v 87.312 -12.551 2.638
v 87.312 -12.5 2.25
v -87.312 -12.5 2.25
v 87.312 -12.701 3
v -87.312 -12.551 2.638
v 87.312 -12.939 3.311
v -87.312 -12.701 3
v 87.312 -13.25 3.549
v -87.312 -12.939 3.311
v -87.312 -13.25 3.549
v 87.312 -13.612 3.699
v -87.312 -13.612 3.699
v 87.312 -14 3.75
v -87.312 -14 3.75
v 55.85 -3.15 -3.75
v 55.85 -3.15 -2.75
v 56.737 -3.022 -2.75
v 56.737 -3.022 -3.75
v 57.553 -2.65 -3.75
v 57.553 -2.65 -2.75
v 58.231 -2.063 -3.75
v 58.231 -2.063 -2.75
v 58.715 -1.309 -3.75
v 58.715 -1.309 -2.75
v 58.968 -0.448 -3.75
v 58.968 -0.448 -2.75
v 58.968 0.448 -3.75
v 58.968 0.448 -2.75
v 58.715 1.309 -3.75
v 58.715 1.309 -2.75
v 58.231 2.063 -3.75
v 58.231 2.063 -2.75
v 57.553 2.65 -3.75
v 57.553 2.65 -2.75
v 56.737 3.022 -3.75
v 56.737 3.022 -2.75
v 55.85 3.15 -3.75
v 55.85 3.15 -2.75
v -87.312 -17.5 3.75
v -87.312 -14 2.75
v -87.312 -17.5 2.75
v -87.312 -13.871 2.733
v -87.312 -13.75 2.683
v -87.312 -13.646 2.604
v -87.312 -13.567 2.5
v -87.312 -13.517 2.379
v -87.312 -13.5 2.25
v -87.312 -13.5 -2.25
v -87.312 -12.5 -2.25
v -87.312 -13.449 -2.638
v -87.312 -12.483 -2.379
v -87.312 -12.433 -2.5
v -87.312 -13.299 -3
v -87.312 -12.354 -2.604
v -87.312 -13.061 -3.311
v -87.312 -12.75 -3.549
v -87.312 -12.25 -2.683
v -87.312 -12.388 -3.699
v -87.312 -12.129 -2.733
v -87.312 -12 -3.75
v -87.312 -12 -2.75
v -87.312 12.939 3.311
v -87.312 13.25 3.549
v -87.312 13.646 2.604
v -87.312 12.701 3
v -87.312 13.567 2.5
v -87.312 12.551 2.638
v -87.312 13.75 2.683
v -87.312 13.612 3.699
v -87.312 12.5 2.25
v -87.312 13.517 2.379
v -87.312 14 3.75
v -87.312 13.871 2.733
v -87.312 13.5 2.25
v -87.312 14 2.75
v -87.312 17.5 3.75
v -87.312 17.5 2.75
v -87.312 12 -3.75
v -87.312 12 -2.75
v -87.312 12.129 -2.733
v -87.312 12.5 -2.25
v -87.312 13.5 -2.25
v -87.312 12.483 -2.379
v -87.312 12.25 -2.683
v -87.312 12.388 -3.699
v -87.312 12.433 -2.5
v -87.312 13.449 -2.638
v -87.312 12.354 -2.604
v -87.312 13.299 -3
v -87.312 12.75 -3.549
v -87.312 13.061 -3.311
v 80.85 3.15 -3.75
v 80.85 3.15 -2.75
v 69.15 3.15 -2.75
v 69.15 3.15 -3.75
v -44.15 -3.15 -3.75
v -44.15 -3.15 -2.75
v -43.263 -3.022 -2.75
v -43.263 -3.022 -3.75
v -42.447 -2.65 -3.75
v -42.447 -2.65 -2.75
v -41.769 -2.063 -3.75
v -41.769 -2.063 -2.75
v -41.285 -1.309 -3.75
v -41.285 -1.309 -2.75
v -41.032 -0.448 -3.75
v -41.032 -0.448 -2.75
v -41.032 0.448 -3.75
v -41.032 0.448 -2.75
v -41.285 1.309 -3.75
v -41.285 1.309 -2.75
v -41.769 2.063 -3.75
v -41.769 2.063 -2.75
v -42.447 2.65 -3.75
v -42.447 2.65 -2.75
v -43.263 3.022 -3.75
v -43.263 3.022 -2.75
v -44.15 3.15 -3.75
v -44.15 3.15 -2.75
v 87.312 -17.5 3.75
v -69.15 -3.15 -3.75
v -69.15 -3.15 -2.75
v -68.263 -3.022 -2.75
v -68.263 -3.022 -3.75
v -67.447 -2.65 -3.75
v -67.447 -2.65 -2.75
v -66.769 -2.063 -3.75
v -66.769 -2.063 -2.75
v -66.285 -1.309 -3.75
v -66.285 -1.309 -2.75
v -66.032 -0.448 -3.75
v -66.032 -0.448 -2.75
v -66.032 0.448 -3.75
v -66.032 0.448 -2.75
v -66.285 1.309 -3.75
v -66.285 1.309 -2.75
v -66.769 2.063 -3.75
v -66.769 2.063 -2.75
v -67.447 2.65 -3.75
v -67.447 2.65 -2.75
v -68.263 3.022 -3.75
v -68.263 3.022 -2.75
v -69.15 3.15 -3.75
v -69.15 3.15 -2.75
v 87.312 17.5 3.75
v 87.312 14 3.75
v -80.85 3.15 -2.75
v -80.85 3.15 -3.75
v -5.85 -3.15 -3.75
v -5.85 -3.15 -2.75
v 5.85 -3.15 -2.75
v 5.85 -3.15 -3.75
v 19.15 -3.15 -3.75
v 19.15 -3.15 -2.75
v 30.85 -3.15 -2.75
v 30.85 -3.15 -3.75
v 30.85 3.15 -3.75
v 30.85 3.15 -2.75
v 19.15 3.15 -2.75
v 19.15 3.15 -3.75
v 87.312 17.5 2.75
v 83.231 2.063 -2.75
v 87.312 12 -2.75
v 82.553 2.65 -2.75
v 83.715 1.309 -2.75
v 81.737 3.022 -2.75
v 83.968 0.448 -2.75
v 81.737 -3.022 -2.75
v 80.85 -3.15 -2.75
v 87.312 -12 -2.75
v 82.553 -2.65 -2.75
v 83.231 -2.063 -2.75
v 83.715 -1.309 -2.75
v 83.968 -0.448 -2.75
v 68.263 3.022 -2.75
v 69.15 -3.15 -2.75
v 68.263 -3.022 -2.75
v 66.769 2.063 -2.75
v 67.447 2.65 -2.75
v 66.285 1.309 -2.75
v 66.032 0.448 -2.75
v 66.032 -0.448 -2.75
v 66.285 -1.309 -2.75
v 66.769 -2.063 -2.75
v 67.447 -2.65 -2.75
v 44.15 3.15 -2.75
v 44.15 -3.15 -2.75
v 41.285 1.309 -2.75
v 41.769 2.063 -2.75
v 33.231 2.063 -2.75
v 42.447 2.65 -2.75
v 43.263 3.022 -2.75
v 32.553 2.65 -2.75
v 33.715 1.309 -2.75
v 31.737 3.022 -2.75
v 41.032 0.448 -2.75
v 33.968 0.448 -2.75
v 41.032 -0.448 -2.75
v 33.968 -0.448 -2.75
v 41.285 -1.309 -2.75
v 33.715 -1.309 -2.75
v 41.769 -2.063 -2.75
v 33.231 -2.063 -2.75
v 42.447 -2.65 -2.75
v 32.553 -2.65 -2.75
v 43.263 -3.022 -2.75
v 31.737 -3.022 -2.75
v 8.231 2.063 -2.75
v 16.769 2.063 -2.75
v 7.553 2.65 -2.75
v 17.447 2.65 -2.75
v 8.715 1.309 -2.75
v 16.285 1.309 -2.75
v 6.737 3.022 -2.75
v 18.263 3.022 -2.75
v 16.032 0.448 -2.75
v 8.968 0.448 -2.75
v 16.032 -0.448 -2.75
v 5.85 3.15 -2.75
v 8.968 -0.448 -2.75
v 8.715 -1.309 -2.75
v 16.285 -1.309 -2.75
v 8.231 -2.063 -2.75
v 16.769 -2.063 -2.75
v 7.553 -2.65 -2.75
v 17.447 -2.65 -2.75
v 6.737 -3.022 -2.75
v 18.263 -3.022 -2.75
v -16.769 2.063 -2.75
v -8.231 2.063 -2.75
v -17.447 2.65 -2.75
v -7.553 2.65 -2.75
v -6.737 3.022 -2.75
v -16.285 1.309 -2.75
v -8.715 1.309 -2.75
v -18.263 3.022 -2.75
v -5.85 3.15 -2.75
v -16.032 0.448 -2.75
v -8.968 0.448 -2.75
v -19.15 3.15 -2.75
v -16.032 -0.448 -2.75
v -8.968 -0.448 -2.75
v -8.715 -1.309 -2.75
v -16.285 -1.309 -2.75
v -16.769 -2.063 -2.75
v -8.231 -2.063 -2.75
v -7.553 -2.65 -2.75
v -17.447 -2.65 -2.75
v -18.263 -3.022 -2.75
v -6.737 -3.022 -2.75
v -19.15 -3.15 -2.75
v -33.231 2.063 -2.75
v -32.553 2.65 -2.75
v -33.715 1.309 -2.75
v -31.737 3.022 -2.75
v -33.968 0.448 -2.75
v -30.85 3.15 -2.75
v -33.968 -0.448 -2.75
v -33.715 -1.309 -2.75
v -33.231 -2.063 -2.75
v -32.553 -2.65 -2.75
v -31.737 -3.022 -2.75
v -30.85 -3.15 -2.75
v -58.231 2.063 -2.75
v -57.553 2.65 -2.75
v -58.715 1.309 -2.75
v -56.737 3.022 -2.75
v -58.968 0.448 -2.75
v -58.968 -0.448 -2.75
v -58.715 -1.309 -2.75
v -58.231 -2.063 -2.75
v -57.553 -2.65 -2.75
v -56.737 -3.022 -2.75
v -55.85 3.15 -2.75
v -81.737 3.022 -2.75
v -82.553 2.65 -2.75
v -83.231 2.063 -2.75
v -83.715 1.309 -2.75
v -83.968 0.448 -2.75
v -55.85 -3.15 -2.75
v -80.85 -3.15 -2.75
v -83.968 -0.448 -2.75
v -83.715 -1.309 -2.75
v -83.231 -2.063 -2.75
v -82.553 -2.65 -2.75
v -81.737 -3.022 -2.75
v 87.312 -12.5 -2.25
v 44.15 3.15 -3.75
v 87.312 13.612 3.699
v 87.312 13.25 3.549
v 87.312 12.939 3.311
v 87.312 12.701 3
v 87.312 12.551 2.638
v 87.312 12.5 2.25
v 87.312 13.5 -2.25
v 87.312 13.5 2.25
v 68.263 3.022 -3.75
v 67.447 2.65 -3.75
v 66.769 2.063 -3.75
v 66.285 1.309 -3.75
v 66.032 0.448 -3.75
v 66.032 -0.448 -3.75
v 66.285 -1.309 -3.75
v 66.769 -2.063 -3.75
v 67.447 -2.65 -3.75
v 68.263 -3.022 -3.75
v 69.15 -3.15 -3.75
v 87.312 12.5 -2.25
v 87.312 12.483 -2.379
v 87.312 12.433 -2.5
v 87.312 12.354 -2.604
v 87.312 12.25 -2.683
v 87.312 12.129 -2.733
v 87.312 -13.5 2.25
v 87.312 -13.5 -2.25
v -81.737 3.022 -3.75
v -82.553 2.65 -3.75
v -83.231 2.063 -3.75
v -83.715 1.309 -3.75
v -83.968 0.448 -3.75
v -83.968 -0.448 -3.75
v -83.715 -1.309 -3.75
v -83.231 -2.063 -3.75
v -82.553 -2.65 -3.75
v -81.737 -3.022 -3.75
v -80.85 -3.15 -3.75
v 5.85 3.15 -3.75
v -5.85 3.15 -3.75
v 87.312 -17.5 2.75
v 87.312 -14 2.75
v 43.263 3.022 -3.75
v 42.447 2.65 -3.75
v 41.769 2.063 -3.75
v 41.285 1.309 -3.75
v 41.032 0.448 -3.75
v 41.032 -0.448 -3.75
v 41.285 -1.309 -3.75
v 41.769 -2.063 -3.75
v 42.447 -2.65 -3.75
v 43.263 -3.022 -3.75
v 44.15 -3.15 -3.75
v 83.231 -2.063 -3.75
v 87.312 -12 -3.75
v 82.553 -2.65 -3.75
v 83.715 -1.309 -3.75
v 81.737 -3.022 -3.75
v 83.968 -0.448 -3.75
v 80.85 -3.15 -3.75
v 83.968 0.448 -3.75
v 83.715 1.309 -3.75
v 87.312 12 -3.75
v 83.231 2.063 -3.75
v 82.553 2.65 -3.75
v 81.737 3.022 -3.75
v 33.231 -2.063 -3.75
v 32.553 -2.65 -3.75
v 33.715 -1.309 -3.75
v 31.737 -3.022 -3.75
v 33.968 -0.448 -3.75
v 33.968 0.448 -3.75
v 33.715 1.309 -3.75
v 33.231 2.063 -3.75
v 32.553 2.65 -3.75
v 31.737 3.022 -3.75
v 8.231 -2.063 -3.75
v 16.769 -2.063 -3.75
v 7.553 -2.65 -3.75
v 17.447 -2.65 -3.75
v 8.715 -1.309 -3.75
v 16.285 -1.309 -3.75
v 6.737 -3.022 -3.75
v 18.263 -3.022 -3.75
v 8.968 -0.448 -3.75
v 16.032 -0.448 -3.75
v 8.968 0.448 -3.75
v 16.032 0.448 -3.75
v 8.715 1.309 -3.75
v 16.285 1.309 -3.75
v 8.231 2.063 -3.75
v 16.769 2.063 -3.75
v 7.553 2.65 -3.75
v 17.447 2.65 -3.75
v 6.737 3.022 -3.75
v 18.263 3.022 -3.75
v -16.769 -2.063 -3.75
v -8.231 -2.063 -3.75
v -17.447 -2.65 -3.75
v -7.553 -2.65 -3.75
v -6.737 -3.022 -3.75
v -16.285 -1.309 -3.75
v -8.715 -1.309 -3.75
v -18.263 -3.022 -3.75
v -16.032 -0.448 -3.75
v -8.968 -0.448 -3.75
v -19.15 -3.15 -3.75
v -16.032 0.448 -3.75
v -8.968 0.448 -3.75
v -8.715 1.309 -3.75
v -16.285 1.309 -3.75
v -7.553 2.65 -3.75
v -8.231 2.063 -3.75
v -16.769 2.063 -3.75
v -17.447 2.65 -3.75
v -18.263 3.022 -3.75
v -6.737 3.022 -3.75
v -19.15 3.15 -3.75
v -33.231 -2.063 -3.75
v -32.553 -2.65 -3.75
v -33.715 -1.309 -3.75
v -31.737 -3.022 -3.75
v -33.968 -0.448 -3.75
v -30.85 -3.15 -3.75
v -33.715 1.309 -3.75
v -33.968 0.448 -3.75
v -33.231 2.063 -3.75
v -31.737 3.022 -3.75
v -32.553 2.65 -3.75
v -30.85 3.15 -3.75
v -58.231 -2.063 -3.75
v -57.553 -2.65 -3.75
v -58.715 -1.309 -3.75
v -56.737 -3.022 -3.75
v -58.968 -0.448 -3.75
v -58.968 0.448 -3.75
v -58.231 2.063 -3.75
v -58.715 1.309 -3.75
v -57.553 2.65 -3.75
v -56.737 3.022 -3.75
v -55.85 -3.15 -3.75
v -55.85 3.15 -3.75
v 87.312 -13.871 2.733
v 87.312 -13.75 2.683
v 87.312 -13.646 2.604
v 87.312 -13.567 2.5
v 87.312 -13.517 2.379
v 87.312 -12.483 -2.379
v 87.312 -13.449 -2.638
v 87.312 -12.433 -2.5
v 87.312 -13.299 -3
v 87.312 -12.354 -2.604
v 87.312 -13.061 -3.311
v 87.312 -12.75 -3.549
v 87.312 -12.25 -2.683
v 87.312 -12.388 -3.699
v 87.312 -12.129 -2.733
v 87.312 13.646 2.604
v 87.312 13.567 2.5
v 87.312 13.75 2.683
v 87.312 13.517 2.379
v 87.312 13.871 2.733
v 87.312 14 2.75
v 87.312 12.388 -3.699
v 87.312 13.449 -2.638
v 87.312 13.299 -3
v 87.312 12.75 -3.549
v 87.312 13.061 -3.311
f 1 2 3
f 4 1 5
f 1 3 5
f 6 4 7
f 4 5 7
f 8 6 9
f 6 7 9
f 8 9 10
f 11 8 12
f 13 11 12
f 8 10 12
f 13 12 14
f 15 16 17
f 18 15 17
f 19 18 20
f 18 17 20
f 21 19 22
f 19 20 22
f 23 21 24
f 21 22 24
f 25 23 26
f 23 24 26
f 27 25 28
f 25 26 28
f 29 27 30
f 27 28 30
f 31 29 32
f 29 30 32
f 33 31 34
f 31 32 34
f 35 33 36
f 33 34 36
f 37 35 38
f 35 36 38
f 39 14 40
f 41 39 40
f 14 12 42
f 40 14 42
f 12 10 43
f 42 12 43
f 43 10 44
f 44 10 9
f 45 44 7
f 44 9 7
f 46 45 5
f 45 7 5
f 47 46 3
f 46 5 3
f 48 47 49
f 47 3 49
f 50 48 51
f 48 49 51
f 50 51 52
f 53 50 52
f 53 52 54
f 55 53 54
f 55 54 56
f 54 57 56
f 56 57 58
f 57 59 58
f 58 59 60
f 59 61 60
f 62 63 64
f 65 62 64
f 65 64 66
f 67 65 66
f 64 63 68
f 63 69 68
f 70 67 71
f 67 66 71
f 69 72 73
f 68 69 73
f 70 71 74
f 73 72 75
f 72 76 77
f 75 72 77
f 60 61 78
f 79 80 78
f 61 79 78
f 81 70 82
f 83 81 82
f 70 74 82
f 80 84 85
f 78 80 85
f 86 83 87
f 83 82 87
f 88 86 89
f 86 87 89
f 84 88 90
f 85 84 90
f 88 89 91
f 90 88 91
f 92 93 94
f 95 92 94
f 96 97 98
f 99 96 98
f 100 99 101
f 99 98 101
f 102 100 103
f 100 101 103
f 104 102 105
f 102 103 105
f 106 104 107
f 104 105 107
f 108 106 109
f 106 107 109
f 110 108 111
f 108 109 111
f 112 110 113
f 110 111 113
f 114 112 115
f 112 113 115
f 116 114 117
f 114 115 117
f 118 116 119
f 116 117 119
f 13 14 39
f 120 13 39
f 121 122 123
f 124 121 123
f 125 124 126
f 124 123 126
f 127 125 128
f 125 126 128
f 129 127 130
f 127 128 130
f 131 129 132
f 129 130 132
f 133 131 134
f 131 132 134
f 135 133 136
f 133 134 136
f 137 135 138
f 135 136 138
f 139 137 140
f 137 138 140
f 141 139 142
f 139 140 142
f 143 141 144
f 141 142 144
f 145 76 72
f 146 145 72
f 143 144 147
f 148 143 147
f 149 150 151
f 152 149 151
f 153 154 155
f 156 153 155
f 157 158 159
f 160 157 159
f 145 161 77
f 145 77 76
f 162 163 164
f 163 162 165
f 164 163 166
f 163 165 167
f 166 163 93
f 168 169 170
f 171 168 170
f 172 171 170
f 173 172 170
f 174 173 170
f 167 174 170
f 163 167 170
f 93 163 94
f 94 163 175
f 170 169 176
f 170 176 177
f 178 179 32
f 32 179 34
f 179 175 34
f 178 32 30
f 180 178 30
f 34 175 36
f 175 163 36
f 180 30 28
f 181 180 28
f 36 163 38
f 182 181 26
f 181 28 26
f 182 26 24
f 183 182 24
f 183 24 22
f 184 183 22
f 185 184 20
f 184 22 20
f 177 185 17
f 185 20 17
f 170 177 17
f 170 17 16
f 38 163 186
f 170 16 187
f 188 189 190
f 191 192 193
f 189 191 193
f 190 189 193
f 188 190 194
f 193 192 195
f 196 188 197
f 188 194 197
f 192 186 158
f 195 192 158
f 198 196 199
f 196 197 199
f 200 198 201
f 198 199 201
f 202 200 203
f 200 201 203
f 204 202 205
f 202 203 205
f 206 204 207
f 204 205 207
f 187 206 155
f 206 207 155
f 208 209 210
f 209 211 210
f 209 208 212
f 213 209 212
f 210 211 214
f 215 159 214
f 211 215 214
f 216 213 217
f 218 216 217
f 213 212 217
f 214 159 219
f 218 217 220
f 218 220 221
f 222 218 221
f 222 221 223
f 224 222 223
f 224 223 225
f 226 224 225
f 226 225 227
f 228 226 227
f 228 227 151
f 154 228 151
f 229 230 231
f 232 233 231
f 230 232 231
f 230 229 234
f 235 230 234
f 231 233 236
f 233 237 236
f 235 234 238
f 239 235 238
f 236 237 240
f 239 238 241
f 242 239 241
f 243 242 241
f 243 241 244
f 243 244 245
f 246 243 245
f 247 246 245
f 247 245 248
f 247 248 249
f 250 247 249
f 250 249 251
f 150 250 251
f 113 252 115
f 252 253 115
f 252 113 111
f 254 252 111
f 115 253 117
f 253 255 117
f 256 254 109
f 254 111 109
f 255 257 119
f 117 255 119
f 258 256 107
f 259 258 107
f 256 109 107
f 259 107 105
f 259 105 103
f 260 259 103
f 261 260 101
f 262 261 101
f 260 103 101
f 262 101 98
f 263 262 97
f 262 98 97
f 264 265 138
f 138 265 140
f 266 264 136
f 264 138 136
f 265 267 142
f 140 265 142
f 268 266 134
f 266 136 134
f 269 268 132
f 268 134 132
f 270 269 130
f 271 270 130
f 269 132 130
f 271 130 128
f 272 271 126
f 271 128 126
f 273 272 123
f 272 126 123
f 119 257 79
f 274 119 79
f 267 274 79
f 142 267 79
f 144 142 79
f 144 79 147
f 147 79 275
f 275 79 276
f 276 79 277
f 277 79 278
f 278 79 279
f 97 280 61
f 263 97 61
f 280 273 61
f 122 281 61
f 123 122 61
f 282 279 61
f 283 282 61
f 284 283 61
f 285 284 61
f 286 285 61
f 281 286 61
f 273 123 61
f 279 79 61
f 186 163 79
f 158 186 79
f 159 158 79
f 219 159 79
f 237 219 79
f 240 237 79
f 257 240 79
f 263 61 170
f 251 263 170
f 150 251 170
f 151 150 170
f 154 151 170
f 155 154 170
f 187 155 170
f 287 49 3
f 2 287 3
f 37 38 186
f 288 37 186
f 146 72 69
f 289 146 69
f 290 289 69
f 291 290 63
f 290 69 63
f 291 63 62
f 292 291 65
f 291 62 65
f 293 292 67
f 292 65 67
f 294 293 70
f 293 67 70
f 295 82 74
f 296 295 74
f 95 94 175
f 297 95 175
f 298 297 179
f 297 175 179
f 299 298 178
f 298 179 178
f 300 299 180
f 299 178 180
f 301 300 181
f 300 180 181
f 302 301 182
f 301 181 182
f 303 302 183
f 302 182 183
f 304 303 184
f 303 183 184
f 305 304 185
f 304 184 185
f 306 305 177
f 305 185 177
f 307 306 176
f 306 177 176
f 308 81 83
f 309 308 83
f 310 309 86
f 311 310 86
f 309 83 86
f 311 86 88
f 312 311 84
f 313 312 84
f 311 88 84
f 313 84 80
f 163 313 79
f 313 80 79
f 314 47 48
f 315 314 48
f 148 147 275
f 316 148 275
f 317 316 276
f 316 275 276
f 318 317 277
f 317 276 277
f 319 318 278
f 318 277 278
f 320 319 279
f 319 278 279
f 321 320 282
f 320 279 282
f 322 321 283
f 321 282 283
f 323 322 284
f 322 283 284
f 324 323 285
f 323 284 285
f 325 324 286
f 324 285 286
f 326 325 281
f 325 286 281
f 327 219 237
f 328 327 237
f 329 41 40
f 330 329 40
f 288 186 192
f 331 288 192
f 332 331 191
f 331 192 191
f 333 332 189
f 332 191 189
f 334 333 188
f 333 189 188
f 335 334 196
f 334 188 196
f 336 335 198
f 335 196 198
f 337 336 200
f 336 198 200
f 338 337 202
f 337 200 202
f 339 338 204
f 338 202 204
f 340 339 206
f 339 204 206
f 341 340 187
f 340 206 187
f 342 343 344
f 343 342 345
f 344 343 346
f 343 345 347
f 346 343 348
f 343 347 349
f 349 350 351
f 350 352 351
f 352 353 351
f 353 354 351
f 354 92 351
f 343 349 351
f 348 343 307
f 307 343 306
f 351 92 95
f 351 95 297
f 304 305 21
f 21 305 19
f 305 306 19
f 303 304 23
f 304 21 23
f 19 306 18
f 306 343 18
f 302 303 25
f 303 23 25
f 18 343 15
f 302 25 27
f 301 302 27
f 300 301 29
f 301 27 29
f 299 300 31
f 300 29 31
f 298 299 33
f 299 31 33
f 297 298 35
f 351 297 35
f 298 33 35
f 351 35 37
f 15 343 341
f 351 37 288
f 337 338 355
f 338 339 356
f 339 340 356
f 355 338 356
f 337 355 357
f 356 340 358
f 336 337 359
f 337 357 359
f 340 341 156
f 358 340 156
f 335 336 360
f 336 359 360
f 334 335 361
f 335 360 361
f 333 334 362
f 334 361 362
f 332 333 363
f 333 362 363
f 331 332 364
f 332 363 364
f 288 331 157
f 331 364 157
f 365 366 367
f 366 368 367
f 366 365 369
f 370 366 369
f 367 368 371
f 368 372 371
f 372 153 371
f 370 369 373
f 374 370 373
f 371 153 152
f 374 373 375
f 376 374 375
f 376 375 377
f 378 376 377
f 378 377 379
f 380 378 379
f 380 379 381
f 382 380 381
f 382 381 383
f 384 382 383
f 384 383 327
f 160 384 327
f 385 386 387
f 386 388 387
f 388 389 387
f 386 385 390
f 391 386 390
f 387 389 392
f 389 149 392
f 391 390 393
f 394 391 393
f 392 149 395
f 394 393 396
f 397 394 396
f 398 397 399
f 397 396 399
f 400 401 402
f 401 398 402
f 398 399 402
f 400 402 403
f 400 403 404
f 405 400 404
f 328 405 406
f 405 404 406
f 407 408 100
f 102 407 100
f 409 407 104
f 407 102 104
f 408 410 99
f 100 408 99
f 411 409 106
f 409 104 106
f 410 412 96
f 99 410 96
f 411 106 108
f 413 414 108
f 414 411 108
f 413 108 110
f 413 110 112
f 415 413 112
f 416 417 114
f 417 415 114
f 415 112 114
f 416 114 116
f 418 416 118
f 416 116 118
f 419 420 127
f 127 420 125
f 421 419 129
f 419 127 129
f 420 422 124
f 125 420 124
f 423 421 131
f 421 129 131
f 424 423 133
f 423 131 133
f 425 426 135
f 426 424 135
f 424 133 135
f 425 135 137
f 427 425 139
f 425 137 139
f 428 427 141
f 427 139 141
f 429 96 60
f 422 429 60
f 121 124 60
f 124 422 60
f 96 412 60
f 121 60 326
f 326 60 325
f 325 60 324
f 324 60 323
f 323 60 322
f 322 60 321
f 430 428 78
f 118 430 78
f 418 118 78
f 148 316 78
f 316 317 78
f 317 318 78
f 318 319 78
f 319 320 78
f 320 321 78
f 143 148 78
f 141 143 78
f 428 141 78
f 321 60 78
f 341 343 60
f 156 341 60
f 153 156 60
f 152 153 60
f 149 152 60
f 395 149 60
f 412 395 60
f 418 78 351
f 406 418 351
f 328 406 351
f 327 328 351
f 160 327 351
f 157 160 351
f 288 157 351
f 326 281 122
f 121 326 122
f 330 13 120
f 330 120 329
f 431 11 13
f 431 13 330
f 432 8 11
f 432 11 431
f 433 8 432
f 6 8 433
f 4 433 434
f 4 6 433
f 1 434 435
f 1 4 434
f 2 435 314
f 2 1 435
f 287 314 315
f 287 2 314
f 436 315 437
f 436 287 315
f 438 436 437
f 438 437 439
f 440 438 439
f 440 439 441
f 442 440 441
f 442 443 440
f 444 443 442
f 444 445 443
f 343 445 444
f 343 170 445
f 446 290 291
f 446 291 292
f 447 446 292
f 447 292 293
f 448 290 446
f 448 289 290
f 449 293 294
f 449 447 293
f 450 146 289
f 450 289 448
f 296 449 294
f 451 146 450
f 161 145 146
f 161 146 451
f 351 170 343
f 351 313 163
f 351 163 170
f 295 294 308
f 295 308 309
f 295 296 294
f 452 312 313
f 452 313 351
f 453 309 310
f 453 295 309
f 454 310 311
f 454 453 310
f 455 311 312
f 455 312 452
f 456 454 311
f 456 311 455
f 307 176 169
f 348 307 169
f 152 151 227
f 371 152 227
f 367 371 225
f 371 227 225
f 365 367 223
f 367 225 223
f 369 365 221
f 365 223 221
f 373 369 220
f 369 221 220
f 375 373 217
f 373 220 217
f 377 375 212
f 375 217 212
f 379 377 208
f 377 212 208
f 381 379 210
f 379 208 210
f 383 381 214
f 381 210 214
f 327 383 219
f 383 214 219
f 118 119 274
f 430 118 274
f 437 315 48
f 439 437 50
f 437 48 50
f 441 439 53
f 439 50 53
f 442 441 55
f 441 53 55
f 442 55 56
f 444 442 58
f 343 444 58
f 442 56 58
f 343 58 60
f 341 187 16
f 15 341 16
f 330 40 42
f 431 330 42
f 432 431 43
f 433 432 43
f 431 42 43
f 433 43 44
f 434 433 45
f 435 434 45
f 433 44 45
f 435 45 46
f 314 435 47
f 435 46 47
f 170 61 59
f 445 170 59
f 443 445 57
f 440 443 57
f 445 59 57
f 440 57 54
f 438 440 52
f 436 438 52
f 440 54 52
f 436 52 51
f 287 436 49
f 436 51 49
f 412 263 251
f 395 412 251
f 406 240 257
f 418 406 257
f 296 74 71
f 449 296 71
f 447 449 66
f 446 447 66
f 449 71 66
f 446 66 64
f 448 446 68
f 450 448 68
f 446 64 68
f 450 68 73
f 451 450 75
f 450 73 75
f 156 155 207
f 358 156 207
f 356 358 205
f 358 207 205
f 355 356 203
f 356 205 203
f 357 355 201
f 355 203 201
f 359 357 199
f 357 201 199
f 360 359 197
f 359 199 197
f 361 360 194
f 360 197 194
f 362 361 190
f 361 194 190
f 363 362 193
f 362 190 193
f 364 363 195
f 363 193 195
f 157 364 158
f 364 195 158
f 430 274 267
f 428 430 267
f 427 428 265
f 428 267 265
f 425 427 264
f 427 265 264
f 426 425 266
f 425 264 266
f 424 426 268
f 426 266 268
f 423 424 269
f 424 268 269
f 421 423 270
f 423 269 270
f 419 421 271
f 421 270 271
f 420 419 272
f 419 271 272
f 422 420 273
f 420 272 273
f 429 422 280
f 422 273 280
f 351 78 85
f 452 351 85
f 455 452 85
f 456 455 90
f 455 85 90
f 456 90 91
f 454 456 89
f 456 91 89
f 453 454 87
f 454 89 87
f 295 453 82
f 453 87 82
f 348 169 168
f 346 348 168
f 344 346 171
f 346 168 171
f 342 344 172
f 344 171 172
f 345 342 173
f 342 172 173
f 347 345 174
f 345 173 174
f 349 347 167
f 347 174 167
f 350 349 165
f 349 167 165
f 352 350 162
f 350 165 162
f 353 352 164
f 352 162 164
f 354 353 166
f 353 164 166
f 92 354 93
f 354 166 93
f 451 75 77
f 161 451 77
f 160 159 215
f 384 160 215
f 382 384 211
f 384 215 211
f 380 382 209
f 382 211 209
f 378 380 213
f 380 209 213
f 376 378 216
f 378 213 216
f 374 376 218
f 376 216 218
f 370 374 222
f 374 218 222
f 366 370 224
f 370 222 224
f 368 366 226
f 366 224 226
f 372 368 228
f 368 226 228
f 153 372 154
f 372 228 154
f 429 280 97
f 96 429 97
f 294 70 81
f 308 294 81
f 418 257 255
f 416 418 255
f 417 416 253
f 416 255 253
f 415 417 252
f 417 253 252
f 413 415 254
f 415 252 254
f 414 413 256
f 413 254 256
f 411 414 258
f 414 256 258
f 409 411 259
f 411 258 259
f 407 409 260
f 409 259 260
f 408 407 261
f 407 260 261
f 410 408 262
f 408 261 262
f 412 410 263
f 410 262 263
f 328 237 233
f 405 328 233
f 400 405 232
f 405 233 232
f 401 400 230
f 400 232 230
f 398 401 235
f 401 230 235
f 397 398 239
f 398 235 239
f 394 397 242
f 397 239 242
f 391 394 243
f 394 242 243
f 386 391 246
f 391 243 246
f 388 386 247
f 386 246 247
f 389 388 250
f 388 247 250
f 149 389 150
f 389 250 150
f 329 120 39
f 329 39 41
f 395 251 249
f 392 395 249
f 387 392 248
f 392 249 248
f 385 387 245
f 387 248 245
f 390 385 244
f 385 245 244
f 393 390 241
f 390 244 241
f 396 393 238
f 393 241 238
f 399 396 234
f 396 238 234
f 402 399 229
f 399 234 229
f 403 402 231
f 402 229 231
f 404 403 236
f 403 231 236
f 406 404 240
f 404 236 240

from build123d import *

# Parameters (mm, degrees)
EXTRUDE_THIN1_DEPTH      = 87.3125
EXTRUDE_THIN1_DEPTH_BACK = 87.3125
CUT_EXTRUDE1_DEPTH       = 90.127914574
LPATTERN1_COUNT          = 4
LPATTERN1_PITCH          = 25
LPATTERN1_COL_COUNT      = 4
LPATTERN1_COL_PITCH      = 25


with BuildPart() as part:
    # Sketch3 → Extrude-Thin1 (new, two sides: drawn at the far end of the back side and taken through both)
    with BuildSketch(Plane(origin=(0, 0, 0), x_dir=(0, 0, -1), z_dir=(1, 0, 0)).offset(-EXTRUDE_THIN1_DEPTH_BACK)):
        with BuildLine():
            Line((-2.75, -17.5), (-2.75, -14))
            ThreePointArc((-2.75, -14), (-2.603553391, -13.646446609), (-2.25, -13.5))
            Line((-2.25, -13.5), (2.25, -13.5))
            ThreePointArc((2.25, -13.5), (3.310660172, -13.060660172), (3.75, -12))
            Line((3.75, -12), (3.75, 12))
            ThreePointArc((3.75, 12), (3.310660172, 13.060660172), (2.25, 13.5))
            Line((2.25, 13.5), (-2.25, 13.5))
            ThreePointArc((-2.25, 13.5), (-2.603553391, 13.646446609), (-2.75, 14))
            Line((-2.75, 14), (-2.75, 17.5))
            Line((-2.75, 17.5), (-3.75, 17.5))
            Line((-3.75, 17.5), (-3.75, 14))
            ThreePointArc((-3.75, 14), (-3.310660172, 12.939339828), (-2.25, 12.5))
            Line((-2.25, 12.5), (2.25, 12.5))
            ThreePointArc((2.25, 12.5), (2.603553391, 12.353553391), (2.75, 12))
            Line((2.75, 12), (2.75, -12))
            ThreePointArc((2.75, -12), (2.603553391, -12.353553391), (2.25, -12.5))
            Line((2.25, -12.5), (-2.25, -12.5))
            ThreePointArc((-2.25, -12.5), (-3.310660172, -12.939339828), (-3.75, -14))
            Line((-3.75, -14), (-3.75, -17.5))
            Line((-3.75, -17.5), (-2.75, -17.5))
        make_face()
    extrude(amount=EXTRUDE_THIN1_DEPTH + EXTRUDE_THIN1_DEPTH_BACK)

    # Sketch4 → Cut-Extrude1 (cut, through all)
    with BuildSketch(Plane.XY):
        with BuildLine():
            Line((-5.85, -3.15), (5.85, -3.15))
            ThreePointArc((5.85, -3.15), (9, 0), (5.85, 3.15))
            Line((5.85, 3.15), (-5.85, 3.15))
            ThreePointArc((-5.85, 3.15), (-9, 0), (-5.85, -3.15))
        make_face()
    cut_extrude1 = extrude(amount=-CUT_EXTRUDE1_DEPTH, mode=Mode.SUBTRACT)

    # LPattern1: Cut-Extrude1 ×4
    with Locations(*[(i * LPATTERN1_PITCH, 0, 0) for i in range(1, LPATTERN1_COUNT)]):
        add(cut_extrude1, mode=Mode.SUBTRACT)

    # LPattern1 col: Cut-Extrude1 ×4
    with Locations(*[(-i * LPATTERN1_COL_PITCH, 0, 0) for i in range(1, LPATTERN1_COL_COUNT)]):
        add(cut_extrude1, mode=Mode.SUBTRACT)


solid = part.part
